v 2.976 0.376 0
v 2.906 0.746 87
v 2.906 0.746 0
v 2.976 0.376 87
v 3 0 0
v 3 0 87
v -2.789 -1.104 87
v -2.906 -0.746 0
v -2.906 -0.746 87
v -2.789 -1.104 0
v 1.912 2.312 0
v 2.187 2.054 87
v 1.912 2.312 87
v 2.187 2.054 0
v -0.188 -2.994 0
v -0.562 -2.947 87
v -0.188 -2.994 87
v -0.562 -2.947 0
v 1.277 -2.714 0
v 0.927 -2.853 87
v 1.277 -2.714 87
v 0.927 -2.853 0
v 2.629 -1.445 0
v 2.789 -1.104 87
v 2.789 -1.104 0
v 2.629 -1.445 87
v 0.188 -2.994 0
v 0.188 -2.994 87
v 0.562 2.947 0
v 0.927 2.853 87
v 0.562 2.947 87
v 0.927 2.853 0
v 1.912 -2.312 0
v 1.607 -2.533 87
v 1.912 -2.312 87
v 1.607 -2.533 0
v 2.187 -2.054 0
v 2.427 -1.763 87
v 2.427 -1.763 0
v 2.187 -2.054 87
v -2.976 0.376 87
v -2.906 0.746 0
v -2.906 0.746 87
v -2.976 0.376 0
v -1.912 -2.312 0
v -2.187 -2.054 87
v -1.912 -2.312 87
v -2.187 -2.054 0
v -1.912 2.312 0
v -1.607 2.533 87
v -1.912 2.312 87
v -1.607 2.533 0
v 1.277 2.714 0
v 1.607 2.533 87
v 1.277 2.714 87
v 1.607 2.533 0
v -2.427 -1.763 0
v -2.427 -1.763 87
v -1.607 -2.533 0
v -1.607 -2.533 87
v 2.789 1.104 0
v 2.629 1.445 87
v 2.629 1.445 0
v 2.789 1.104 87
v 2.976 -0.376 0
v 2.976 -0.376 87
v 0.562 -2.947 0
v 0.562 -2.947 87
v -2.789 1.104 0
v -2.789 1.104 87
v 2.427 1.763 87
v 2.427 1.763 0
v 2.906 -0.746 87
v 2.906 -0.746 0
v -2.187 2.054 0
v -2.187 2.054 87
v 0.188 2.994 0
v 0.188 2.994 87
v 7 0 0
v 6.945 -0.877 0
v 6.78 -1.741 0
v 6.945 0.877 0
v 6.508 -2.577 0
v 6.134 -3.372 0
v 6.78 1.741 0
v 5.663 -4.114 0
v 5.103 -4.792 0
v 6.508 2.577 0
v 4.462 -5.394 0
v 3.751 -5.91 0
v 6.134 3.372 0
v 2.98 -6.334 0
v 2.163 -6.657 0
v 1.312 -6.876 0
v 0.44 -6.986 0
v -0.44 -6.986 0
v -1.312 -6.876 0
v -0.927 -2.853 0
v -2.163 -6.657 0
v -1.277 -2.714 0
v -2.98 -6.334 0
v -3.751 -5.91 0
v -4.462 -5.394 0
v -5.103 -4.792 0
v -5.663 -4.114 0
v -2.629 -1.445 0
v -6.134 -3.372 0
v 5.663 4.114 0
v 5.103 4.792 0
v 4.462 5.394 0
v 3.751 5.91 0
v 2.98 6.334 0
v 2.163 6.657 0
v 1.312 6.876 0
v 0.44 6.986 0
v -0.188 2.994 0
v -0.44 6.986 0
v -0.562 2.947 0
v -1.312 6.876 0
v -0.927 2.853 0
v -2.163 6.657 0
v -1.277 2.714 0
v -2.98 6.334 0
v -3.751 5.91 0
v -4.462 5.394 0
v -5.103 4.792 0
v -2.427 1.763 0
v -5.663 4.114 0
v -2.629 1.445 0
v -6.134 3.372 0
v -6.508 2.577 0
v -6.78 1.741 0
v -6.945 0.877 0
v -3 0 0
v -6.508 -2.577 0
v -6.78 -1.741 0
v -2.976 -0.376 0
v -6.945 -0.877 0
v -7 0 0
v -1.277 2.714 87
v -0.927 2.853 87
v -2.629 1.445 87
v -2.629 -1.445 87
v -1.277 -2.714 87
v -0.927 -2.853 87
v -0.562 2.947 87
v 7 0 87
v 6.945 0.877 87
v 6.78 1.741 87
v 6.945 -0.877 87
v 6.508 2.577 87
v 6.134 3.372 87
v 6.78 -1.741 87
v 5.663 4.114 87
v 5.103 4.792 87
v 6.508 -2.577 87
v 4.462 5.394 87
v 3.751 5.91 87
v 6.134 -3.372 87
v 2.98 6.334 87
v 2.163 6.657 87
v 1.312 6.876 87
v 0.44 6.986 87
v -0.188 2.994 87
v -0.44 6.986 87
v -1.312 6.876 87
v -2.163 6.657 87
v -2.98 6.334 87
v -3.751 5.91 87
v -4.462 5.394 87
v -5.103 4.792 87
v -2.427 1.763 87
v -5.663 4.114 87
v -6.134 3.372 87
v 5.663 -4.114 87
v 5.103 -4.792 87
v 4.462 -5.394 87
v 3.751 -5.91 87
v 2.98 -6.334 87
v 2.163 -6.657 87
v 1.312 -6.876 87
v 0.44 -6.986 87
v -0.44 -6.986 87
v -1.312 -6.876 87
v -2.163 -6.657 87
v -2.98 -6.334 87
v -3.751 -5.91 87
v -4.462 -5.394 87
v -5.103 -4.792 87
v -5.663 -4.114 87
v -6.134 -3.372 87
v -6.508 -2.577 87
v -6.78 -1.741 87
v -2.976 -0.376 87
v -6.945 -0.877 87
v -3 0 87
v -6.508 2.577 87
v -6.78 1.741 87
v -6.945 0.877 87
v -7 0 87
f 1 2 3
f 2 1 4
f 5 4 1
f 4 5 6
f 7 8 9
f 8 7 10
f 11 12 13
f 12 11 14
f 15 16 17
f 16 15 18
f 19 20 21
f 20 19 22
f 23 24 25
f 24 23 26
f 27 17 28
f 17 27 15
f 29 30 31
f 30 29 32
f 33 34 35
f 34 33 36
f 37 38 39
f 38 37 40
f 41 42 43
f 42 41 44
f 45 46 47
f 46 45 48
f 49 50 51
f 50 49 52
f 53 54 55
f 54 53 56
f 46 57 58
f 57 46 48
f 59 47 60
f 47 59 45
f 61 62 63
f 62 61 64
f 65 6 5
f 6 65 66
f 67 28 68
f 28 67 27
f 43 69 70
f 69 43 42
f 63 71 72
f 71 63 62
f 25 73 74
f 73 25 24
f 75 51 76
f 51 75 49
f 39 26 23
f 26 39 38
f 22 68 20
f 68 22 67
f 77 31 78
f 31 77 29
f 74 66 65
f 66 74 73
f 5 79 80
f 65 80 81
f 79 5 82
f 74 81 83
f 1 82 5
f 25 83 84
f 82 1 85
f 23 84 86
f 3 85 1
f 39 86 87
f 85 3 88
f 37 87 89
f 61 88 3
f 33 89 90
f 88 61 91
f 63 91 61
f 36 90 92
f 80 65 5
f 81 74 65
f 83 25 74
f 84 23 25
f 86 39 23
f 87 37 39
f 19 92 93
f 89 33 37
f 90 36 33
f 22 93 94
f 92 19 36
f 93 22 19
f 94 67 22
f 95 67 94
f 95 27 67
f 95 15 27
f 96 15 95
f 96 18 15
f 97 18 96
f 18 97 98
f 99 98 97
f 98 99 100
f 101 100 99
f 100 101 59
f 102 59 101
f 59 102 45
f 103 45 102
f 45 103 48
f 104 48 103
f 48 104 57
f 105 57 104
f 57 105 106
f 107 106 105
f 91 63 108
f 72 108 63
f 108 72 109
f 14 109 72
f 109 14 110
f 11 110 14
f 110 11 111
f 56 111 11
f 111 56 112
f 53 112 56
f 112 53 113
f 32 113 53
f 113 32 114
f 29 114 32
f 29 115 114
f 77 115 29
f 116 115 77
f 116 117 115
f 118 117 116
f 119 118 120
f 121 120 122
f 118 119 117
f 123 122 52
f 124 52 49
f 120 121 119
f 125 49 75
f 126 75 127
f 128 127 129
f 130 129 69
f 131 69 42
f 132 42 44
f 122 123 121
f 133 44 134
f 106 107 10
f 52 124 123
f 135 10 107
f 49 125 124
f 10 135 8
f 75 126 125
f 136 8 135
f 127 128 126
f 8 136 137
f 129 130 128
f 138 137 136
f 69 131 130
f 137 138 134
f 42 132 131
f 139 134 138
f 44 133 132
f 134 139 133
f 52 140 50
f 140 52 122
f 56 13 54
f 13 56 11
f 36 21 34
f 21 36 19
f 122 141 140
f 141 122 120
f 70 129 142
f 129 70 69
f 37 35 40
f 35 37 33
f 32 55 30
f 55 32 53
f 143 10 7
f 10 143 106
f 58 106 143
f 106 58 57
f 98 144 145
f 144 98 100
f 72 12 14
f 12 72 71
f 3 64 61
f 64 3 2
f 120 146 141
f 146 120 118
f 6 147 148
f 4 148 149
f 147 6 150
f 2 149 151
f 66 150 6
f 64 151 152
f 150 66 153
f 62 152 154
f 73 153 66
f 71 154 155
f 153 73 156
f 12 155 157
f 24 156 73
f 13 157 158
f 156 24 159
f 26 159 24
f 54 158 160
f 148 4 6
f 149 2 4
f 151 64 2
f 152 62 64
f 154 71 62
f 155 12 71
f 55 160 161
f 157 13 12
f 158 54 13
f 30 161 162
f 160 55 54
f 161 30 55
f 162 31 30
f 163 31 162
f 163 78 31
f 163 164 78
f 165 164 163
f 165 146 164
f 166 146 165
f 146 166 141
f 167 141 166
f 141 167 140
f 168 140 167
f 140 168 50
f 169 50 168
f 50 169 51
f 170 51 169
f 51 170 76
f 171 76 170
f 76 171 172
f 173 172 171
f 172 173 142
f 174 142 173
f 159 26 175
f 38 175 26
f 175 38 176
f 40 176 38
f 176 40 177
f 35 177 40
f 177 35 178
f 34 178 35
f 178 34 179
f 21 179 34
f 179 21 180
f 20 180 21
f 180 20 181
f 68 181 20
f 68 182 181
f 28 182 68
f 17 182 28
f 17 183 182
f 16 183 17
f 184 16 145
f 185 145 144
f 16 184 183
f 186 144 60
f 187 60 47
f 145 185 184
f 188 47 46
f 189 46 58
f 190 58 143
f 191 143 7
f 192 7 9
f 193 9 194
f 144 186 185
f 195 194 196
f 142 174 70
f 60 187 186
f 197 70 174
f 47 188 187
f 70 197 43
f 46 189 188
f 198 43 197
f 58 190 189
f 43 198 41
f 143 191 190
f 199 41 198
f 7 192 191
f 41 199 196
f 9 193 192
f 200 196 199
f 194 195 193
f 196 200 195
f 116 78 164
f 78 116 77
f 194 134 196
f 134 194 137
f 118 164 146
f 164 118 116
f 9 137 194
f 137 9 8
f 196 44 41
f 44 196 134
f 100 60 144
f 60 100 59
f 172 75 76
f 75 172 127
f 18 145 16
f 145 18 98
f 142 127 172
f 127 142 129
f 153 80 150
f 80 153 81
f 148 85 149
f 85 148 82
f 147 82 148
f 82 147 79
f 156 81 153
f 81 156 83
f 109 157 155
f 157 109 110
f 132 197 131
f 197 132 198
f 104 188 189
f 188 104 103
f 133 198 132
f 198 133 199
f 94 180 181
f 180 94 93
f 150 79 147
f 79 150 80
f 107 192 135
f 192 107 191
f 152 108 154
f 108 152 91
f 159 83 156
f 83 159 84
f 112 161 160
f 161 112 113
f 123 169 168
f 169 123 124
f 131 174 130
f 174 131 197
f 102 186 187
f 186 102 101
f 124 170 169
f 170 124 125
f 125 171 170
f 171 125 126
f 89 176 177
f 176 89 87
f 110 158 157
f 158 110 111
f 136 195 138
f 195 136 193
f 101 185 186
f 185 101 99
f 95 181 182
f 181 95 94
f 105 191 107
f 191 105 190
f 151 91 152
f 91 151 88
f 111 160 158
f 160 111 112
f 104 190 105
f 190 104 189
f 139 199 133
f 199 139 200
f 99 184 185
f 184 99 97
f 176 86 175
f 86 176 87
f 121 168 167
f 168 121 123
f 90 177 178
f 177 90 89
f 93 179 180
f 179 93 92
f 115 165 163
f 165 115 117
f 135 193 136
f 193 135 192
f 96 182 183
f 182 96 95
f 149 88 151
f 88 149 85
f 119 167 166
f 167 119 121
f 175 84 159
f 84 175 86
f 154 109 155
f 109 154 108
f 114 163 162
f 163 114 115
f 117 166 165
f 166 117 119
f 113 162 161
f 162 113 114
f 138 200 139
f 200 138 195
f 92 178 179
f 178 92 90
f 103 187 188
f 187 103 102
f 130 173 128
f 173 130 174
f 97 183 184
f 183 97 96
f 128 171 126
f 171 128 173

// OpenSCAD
$fn = 50;


difference() {
	union() {
		cylinder(h = 87, r = 7.0000000000);
	}
	union() {
		cylinder(h = 87, r = 3.0000000000);
		cylinder(h = 87, r = 1.5000000000);
		cylinder(h = 87, r = 1.5000000000);
		cylinder(h = 87, r = 1.5000000000);
	}
}
